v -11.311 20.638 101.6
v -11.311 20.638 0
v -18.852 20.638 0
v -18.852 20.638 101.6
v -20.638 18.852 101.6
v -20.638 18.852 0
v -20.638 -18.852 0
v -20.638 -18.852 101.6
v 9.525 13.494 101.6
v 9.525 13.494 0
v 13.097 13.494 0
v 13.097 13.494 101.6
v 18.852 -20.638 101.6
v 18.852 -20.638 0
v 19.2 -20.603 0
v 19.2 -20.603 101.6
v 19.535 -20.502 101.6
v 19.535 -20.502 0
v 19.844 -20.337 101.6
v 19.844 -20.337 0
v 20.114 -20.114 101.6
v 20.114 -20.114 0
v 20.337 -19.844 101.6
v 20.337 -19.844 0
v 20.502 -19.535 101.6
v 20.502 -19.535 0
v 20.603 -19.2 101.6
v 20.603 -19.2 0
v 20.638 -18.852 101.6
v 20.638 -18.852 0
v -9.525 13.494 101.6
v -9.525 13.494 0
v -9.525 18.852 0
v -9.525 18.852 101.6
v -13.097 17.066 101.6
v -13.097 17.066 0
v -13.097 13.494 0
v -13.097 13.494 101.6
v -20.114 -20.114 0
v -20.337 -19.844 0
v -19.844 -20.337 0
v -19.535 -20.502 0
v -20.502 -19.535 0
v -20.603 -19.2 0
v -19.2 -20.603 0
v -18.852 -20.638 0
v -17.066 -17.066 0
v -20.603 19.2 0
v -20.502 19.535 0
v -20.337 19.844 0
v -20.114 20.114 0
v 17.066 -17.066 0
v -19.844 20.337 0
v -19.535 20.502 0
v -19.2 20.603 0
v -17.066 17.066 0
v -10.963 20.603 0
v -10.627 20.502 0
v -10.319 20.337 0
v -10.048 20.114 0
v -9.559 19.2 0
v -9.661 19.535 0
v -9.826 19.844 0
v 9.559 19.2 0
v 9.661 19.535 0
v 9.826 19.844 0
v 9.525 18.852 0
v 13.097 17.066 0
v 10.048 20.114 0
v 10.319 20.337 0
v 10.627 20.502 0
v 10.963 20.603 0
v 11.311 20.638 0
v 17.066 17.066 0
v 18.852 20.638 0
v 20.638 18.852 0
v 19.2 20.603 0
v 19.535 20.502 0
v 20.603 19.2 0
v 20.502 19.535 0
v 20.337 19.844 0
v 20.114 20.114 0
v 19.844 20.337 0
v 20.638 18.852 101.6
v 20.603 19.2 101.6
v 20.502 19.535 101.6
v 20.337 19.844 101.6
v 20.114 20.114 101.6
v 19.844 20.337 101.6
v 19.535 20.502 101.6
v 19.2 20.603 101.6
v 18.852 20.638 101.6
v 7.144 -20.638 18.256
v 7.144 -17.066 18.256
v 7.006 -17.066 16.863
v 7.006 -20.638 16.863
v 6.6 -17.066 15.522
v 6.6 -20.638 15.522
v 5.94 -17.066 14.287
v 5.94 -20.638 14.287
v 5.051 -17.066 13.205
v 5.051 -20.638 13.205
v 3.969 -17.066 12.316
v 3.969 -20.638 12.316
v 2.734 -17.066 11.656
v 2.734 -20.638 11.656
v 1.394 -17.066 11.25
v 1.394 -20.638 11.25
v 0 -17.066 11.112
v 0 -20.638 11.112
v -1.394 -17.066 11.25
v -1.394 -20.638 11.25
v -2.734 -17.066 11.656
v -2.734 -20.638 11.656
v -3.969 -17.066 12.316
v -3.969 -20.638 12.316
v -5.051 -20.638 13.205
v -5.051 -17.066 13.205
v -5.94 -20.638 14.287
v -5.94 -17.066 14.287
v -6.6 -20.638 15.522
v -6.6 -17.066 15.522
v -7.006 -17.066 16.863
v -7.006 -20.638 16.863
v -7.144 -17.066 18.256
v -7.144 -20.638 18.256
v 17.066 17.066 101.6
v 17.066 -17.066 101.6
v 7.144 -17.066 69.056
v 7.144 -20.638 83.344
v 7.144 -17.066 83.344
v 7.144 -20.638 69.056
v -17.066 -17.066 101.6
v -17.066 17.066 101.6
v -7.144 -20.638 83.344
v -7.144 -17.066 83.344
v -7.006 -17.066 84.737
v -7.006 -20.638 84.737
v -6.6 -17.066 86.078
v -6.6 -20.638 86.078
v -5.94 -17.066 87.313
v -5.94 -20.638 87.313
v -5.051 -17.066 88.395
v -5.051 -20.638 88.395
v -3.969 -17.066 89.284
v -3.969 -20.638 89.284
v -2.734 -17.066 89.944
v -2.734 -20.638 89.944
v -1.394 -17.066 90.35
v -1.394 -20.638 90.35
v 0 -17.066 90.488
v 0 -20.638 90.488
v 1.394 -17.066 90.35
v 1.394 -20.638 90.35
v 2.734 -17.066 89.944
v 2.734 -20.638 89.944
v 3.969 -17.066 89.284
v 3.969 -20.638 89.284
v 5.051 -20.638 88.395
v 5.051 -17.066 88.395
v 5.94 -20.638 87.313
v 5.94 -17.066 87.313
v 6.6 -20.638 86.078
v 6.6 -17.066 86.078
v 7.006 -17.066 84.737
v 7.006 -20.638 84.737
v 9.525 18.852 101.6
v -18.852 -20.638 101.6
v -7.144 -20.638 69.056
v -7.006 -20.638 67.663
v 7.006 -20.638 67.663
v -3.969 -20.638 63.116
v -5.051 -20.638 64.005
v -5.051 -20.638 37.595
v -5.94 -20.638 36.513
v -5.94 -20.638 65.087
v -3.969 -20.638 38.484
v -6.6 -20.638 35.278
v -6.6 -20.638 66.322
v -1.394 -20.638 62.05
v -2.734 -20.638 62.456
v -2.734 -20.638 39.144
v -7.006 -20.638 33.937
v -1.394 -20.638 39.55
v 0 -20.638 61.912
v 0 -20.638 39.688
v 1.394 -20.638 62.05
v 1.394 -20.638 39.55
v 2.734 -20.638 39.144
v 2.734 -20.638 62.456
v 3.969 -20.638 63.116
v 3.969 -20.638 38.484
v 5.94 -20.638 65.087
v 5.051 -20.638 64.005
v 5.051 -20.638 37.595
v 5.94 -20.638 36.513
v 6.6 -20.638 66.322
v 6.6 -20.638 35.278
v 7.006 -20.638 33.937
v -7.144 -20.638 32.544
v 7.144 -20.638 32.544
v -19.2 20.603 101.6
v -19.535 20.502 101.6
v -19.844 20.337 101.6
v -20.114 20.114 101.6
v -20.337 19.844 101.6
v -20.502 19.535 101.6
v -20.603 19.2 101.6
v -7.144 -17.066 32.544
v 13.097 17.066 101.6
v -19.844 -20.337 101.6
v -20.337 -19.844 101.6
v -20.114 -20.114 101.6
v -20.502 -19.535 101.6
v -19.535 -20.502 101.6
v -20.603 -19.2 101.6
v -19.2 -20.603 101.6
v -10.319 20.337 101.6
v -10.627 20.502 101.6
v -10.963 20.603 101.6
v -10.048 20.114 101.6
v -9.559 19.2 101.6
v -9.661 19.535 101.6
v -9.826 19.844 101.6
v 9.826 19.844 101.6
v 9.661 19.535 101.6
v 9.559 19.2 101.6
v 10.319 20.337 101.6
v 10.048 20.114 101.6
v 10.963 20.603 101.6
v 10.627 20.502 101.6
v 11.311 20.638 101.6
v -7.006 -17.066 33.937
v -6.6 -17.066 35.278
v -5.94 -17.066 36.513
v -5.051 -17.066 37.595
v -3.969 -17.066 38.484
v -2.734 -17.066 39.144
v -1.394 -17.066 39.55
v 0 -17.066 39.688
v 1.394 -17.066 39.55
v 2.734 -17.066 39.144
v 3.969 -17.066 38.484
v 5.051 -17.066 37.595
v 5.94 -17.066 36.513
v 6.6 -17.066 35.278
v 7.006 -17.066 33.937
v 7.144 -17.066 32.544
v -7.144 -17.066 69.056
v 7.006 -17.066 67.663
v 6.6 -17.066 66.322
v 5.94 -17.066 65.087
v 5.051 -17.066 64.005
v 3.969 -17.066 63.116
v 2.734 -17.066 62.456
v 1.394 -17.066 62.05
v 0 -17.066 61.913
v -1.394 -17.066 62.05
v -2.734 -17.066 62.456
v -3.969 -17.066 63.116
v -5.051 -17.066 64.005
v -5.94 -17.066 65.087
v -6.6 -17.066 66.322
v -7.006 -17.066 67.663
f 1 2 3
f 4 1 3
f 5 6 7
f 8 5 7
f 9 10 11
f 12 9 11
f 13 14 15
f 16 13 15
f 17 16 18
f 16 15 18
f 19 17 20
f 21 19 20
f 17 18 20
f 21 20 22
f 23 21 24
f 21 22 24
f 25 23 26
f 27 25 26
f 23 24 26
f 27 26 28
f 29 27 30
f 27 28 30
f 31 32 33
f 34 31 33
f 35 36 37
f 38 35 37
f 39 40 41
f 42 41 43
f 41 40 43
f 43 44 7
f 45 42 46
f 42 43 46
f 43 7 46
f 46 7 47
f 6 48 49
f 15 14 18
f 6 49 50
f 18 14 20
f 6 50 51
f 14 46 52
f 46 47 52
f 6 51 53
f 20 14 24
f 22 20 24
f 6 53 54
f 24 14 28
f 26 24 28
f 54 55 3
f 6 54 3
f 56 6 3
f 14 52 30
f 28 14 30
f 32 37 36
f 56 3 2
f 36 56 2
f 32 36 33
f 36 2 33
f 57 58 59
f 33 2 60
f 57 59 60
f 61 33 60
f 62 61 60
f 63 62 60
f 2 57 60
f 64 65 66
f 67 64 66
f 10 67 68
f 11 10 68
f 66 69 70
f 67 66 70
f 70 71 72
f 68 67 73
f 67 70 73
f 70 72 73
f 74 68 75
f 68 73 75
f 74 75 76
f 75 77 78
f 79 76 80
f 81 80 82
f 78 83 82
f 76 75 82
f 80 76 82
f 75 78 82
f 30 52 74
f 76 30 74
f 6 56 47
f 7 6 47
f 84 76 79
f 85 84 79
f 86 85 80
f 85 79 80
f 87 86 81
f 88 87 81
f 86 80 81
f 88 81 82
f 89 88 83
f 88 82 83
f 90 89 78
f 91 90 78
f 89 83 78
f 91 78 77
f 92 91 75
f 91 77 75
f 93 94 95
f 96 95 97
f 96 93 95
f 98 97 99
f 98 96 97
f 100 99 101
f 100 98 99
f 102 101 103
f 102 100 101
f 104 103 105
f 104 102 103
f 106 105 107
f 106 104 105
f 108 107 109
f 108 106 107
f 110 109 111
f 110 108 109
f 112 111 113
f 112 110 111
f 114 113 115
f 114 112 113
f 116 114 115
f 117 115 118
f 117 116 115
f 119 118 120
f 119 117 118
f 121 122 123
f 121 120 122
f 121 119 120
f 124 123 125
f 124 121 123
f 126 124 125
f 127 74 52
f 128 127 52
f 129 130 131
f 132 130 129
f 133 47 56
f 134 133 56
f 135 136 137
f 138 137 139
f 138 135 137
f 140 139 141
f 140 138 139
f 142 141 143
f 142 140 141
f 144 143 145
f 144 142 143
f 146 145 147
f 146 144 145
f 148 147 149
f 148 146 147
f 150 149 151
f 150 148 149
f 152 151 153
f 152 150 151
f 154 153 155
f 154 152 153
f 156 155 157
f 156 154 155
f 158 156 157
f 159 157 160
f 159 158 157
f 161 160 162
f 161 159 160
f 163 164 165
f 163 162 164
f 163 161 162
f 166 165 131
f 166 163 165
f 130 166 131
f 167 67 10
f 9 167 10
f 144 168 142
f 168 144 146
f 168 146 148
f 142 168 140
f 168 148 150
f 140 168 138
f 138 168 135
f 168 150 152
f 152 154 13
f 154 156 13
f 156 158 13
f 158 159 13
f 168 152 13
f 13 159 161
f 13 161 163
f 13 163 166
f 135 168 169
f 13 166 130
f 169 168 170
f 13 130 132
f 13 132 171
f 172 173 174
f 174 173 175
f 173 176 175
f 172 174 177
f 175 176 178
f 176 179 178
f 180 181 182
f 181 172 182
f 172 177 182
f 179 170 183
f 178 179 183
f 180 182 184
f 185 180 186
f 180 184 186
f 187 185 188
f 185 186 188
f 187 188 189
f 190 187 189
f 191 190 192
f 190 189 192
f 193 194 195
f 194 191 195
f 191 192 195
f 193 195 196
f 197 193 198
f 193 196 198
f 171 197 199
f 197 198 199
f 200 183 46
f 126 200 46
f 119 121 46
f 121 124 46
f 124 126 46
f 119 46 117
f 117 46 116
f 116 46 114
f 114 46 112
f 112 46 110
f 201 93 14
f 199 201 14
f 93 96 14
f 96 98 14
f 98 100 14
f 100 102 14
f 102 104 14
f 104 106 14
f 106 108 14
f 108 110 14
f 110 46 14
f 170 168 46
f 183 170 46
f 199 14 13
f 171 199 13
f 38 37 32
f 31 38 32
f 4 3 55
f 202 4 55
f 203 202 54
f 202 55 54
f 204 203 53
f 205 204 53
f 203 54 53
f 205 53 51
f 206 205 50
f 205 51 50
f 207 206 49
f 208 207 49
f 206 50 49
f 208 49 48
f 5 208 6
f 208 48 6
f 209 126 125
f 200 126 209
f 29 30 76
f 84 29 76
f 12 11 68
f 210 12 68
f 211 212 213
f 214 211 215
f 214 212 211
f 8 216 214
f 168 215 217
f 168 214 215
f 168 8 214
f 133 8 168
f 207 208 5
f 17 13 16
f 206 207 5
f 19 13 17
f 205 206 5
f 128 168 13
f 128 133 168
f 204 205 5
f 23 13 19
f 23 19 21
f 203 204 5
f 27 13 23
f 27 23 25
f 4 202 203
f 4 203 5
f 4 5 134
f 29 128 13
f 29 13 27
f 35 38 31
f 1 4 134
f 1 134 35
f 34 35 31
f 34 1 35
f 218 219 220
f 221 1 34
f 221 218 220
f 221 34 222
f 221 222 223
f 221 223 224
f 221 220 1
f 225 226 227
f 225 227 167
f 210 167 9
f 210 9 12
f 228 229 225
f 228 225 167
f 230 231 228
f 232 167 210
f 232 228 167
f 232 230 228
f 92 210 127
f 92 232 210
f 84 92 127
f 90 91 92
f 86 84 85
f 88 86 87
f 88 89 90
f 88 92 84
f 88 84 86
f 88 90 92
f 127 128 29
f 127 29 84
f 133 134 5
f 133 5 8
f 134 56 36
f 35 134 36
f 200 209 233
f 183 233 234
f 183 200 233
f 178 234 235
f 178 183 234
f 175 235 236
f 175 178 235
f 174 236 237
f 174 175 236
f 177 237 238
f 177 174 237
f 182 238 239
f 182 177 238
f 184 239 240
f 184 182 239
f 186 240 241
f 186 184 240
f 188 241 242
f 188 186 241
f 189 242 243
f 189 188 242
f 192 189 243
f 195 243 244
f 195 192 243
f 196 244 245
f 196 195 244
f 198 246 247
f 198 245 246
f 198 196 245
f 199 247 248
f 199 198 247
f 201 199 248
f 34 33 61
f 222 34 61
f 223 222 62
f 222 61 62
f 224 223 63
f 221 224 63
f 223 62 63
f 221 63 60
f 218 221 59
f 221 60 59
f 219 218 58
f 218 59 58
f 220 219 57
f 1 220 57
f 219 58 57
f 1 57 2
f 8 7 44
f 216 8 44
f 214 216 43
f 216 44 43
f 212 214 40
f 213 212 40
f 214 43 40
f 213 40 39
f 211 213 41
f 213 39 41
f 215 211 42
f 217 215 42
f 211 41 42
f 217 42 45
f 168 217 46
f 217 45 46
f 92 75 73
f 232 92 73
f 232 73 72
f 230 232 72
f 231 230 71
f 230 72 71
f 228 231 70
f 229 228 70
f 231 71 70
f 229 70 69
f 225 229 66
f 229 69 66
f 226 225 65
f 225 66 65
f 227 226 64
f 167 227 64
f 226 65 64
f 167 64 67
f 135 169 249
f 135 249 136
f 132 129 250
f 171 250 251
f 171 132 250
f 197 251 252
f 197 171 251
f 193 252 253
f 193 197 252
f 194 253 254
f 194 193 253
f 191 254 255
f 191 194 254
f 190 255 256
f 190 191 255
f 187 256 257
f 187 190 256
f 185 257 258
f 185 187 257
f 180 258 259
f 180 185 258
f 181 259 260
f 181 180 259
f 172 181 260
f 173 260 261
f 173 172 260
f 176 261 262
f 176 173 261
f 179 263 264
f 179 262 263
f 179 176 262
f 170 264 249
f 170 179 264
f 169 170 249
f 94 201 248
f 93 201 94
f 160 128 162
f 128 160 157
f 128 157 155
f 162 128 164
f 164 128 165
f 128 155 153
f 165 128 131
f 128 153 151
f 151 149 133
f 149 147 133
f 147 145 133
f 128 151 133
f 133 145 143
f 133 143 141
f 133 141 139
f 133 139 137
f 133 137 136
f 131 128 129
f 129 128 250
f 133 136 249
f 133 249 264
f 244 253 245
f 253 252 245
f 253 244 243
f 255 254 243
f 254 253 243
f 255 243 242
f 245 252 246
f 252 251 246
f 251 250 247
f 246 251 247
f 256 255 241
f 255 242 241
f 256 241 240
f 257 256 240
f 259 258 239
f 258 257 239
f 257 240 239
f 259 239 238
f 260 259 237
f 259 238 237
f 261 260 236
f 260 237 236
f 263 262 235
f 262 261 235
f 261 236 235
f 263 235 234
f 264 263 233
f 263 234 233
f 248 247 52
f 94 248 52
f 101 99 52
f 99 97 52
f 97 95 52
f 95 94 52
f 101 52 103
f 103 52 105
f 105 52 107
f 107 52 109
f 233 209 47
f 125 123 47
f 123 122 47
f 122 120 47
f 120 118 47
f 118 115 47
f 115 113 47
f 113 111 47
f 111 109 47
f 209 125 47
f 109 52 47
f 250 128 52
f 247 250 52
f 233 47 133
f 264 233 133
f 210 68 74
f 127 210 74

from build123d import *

# Parameters (mm, degrees)
BASE_EXTRUDE_DEPTH = 101.6
SLOT_DEPTH         = 112.588942245
LPATTERN1_COUNT    = 2
LPATTERN1_PITCH    = 50.8


with BuildPart() as part:
    # Sketch1 → Base-Extrude (new body)
    with BuildSketch(Plane.XY):
        with BuildLine():
            Line((-11.3109375, 20.6375), (-18.8515625, 20.6375))
            ThreePointArc((-18.8515625, 20.6375), (-20.114411017, 20.114411017), (-20.6375, 18.8515625))
            Line((-20.6375, 18.8515625), (-20.6375, -18.8515625))
            ThreePointArc((-20.6375, -18.8515625), (-20.114411017, -20.114411017), (-18.8515625, -20.6375))
            Line((-18.8515625, -20.6375), (18.8515625, -20.6375))
            ThreePointArc((18.8515625, -20.6375), (20.114411017, -20.114411017), (20.6375, -18.8515625))
            Line((20.6375, -18.8515625), (20.6375, 18.8515625))
            ThreePointArc((20.6375, 18.8515625), (20.114411017, 20.114411017), (18.8515625, 20.6375))
            Line((18.8515625, 20.6375), (11.3109375, 20.6375))
            ThreePointArc((11.3109375, 20.6375), (10.048088983, 20.114411017), (9.525, 18.8515625))
            Line((9.525, 18.8515625), (9.525, 13.49375))
            Line((9.525, 13.49375), (13.096875, 13.49375))
            Line((13.096875, 13.49375), (13.096875, 17.065625))
            Line((13.096875, 17.065625), (17.065625, 17.065625))
            Line((17.065625, 17.065625), (17.065625, -17.065625))
            Line((17.065625, -17.065625), (-17.065625, -17.065625))
            Line((-17.065625, -17.065625), (-17.065625, 17.065625))
            Line((-17.065625, 17.065625), (-13.096875, 17.065625))
            Line((-13.096875, 17.065625), (-13.096875, 13.49375))
            Line((-13.096875, 13.49375), (-9.525, 13.49375))
            Line((-9.525, 13.49375), (-9.525, 18.8515625))
            ThreePointArc((-9.525, 18.8515625), (-10.048088983, 20.114411017), (-11.3109375, 20.6375))
        make_face()
    extrude(amount=BASE_EXTRUDE_DEPTH)

    # Sketch2 → Slot (cut, through all)
    with BuildSketch(Plane.XZ.offset(20.6375)):
        with BuildLine():
            Line((7.14375, 32.54375), (7.14375, 18.25625))
            ThreePointArc((7.14375, 18.25625), (0, 11.1125), (-7.14375, 18.25625))
            Line((-7.14375, 18.25625), (-7.14375, 32.54375))
            ThreePointArc((-7.14375, 32.54375), (0, 39.6875), (7.14375, 32.54375))
        make_face()
    slot = extrude(amount=-SLOT_DEPTH, mode=Mode.SUBTRACT)

    # LPattern1: Slot ×2
    with Locations(*[(0, 0, i * LPATTERN1_PITCH) for i in range(1, LPATTERN1_COUNT)]):
        add(slot, mode=Mode.SUBTRACT)


solid = part.part
